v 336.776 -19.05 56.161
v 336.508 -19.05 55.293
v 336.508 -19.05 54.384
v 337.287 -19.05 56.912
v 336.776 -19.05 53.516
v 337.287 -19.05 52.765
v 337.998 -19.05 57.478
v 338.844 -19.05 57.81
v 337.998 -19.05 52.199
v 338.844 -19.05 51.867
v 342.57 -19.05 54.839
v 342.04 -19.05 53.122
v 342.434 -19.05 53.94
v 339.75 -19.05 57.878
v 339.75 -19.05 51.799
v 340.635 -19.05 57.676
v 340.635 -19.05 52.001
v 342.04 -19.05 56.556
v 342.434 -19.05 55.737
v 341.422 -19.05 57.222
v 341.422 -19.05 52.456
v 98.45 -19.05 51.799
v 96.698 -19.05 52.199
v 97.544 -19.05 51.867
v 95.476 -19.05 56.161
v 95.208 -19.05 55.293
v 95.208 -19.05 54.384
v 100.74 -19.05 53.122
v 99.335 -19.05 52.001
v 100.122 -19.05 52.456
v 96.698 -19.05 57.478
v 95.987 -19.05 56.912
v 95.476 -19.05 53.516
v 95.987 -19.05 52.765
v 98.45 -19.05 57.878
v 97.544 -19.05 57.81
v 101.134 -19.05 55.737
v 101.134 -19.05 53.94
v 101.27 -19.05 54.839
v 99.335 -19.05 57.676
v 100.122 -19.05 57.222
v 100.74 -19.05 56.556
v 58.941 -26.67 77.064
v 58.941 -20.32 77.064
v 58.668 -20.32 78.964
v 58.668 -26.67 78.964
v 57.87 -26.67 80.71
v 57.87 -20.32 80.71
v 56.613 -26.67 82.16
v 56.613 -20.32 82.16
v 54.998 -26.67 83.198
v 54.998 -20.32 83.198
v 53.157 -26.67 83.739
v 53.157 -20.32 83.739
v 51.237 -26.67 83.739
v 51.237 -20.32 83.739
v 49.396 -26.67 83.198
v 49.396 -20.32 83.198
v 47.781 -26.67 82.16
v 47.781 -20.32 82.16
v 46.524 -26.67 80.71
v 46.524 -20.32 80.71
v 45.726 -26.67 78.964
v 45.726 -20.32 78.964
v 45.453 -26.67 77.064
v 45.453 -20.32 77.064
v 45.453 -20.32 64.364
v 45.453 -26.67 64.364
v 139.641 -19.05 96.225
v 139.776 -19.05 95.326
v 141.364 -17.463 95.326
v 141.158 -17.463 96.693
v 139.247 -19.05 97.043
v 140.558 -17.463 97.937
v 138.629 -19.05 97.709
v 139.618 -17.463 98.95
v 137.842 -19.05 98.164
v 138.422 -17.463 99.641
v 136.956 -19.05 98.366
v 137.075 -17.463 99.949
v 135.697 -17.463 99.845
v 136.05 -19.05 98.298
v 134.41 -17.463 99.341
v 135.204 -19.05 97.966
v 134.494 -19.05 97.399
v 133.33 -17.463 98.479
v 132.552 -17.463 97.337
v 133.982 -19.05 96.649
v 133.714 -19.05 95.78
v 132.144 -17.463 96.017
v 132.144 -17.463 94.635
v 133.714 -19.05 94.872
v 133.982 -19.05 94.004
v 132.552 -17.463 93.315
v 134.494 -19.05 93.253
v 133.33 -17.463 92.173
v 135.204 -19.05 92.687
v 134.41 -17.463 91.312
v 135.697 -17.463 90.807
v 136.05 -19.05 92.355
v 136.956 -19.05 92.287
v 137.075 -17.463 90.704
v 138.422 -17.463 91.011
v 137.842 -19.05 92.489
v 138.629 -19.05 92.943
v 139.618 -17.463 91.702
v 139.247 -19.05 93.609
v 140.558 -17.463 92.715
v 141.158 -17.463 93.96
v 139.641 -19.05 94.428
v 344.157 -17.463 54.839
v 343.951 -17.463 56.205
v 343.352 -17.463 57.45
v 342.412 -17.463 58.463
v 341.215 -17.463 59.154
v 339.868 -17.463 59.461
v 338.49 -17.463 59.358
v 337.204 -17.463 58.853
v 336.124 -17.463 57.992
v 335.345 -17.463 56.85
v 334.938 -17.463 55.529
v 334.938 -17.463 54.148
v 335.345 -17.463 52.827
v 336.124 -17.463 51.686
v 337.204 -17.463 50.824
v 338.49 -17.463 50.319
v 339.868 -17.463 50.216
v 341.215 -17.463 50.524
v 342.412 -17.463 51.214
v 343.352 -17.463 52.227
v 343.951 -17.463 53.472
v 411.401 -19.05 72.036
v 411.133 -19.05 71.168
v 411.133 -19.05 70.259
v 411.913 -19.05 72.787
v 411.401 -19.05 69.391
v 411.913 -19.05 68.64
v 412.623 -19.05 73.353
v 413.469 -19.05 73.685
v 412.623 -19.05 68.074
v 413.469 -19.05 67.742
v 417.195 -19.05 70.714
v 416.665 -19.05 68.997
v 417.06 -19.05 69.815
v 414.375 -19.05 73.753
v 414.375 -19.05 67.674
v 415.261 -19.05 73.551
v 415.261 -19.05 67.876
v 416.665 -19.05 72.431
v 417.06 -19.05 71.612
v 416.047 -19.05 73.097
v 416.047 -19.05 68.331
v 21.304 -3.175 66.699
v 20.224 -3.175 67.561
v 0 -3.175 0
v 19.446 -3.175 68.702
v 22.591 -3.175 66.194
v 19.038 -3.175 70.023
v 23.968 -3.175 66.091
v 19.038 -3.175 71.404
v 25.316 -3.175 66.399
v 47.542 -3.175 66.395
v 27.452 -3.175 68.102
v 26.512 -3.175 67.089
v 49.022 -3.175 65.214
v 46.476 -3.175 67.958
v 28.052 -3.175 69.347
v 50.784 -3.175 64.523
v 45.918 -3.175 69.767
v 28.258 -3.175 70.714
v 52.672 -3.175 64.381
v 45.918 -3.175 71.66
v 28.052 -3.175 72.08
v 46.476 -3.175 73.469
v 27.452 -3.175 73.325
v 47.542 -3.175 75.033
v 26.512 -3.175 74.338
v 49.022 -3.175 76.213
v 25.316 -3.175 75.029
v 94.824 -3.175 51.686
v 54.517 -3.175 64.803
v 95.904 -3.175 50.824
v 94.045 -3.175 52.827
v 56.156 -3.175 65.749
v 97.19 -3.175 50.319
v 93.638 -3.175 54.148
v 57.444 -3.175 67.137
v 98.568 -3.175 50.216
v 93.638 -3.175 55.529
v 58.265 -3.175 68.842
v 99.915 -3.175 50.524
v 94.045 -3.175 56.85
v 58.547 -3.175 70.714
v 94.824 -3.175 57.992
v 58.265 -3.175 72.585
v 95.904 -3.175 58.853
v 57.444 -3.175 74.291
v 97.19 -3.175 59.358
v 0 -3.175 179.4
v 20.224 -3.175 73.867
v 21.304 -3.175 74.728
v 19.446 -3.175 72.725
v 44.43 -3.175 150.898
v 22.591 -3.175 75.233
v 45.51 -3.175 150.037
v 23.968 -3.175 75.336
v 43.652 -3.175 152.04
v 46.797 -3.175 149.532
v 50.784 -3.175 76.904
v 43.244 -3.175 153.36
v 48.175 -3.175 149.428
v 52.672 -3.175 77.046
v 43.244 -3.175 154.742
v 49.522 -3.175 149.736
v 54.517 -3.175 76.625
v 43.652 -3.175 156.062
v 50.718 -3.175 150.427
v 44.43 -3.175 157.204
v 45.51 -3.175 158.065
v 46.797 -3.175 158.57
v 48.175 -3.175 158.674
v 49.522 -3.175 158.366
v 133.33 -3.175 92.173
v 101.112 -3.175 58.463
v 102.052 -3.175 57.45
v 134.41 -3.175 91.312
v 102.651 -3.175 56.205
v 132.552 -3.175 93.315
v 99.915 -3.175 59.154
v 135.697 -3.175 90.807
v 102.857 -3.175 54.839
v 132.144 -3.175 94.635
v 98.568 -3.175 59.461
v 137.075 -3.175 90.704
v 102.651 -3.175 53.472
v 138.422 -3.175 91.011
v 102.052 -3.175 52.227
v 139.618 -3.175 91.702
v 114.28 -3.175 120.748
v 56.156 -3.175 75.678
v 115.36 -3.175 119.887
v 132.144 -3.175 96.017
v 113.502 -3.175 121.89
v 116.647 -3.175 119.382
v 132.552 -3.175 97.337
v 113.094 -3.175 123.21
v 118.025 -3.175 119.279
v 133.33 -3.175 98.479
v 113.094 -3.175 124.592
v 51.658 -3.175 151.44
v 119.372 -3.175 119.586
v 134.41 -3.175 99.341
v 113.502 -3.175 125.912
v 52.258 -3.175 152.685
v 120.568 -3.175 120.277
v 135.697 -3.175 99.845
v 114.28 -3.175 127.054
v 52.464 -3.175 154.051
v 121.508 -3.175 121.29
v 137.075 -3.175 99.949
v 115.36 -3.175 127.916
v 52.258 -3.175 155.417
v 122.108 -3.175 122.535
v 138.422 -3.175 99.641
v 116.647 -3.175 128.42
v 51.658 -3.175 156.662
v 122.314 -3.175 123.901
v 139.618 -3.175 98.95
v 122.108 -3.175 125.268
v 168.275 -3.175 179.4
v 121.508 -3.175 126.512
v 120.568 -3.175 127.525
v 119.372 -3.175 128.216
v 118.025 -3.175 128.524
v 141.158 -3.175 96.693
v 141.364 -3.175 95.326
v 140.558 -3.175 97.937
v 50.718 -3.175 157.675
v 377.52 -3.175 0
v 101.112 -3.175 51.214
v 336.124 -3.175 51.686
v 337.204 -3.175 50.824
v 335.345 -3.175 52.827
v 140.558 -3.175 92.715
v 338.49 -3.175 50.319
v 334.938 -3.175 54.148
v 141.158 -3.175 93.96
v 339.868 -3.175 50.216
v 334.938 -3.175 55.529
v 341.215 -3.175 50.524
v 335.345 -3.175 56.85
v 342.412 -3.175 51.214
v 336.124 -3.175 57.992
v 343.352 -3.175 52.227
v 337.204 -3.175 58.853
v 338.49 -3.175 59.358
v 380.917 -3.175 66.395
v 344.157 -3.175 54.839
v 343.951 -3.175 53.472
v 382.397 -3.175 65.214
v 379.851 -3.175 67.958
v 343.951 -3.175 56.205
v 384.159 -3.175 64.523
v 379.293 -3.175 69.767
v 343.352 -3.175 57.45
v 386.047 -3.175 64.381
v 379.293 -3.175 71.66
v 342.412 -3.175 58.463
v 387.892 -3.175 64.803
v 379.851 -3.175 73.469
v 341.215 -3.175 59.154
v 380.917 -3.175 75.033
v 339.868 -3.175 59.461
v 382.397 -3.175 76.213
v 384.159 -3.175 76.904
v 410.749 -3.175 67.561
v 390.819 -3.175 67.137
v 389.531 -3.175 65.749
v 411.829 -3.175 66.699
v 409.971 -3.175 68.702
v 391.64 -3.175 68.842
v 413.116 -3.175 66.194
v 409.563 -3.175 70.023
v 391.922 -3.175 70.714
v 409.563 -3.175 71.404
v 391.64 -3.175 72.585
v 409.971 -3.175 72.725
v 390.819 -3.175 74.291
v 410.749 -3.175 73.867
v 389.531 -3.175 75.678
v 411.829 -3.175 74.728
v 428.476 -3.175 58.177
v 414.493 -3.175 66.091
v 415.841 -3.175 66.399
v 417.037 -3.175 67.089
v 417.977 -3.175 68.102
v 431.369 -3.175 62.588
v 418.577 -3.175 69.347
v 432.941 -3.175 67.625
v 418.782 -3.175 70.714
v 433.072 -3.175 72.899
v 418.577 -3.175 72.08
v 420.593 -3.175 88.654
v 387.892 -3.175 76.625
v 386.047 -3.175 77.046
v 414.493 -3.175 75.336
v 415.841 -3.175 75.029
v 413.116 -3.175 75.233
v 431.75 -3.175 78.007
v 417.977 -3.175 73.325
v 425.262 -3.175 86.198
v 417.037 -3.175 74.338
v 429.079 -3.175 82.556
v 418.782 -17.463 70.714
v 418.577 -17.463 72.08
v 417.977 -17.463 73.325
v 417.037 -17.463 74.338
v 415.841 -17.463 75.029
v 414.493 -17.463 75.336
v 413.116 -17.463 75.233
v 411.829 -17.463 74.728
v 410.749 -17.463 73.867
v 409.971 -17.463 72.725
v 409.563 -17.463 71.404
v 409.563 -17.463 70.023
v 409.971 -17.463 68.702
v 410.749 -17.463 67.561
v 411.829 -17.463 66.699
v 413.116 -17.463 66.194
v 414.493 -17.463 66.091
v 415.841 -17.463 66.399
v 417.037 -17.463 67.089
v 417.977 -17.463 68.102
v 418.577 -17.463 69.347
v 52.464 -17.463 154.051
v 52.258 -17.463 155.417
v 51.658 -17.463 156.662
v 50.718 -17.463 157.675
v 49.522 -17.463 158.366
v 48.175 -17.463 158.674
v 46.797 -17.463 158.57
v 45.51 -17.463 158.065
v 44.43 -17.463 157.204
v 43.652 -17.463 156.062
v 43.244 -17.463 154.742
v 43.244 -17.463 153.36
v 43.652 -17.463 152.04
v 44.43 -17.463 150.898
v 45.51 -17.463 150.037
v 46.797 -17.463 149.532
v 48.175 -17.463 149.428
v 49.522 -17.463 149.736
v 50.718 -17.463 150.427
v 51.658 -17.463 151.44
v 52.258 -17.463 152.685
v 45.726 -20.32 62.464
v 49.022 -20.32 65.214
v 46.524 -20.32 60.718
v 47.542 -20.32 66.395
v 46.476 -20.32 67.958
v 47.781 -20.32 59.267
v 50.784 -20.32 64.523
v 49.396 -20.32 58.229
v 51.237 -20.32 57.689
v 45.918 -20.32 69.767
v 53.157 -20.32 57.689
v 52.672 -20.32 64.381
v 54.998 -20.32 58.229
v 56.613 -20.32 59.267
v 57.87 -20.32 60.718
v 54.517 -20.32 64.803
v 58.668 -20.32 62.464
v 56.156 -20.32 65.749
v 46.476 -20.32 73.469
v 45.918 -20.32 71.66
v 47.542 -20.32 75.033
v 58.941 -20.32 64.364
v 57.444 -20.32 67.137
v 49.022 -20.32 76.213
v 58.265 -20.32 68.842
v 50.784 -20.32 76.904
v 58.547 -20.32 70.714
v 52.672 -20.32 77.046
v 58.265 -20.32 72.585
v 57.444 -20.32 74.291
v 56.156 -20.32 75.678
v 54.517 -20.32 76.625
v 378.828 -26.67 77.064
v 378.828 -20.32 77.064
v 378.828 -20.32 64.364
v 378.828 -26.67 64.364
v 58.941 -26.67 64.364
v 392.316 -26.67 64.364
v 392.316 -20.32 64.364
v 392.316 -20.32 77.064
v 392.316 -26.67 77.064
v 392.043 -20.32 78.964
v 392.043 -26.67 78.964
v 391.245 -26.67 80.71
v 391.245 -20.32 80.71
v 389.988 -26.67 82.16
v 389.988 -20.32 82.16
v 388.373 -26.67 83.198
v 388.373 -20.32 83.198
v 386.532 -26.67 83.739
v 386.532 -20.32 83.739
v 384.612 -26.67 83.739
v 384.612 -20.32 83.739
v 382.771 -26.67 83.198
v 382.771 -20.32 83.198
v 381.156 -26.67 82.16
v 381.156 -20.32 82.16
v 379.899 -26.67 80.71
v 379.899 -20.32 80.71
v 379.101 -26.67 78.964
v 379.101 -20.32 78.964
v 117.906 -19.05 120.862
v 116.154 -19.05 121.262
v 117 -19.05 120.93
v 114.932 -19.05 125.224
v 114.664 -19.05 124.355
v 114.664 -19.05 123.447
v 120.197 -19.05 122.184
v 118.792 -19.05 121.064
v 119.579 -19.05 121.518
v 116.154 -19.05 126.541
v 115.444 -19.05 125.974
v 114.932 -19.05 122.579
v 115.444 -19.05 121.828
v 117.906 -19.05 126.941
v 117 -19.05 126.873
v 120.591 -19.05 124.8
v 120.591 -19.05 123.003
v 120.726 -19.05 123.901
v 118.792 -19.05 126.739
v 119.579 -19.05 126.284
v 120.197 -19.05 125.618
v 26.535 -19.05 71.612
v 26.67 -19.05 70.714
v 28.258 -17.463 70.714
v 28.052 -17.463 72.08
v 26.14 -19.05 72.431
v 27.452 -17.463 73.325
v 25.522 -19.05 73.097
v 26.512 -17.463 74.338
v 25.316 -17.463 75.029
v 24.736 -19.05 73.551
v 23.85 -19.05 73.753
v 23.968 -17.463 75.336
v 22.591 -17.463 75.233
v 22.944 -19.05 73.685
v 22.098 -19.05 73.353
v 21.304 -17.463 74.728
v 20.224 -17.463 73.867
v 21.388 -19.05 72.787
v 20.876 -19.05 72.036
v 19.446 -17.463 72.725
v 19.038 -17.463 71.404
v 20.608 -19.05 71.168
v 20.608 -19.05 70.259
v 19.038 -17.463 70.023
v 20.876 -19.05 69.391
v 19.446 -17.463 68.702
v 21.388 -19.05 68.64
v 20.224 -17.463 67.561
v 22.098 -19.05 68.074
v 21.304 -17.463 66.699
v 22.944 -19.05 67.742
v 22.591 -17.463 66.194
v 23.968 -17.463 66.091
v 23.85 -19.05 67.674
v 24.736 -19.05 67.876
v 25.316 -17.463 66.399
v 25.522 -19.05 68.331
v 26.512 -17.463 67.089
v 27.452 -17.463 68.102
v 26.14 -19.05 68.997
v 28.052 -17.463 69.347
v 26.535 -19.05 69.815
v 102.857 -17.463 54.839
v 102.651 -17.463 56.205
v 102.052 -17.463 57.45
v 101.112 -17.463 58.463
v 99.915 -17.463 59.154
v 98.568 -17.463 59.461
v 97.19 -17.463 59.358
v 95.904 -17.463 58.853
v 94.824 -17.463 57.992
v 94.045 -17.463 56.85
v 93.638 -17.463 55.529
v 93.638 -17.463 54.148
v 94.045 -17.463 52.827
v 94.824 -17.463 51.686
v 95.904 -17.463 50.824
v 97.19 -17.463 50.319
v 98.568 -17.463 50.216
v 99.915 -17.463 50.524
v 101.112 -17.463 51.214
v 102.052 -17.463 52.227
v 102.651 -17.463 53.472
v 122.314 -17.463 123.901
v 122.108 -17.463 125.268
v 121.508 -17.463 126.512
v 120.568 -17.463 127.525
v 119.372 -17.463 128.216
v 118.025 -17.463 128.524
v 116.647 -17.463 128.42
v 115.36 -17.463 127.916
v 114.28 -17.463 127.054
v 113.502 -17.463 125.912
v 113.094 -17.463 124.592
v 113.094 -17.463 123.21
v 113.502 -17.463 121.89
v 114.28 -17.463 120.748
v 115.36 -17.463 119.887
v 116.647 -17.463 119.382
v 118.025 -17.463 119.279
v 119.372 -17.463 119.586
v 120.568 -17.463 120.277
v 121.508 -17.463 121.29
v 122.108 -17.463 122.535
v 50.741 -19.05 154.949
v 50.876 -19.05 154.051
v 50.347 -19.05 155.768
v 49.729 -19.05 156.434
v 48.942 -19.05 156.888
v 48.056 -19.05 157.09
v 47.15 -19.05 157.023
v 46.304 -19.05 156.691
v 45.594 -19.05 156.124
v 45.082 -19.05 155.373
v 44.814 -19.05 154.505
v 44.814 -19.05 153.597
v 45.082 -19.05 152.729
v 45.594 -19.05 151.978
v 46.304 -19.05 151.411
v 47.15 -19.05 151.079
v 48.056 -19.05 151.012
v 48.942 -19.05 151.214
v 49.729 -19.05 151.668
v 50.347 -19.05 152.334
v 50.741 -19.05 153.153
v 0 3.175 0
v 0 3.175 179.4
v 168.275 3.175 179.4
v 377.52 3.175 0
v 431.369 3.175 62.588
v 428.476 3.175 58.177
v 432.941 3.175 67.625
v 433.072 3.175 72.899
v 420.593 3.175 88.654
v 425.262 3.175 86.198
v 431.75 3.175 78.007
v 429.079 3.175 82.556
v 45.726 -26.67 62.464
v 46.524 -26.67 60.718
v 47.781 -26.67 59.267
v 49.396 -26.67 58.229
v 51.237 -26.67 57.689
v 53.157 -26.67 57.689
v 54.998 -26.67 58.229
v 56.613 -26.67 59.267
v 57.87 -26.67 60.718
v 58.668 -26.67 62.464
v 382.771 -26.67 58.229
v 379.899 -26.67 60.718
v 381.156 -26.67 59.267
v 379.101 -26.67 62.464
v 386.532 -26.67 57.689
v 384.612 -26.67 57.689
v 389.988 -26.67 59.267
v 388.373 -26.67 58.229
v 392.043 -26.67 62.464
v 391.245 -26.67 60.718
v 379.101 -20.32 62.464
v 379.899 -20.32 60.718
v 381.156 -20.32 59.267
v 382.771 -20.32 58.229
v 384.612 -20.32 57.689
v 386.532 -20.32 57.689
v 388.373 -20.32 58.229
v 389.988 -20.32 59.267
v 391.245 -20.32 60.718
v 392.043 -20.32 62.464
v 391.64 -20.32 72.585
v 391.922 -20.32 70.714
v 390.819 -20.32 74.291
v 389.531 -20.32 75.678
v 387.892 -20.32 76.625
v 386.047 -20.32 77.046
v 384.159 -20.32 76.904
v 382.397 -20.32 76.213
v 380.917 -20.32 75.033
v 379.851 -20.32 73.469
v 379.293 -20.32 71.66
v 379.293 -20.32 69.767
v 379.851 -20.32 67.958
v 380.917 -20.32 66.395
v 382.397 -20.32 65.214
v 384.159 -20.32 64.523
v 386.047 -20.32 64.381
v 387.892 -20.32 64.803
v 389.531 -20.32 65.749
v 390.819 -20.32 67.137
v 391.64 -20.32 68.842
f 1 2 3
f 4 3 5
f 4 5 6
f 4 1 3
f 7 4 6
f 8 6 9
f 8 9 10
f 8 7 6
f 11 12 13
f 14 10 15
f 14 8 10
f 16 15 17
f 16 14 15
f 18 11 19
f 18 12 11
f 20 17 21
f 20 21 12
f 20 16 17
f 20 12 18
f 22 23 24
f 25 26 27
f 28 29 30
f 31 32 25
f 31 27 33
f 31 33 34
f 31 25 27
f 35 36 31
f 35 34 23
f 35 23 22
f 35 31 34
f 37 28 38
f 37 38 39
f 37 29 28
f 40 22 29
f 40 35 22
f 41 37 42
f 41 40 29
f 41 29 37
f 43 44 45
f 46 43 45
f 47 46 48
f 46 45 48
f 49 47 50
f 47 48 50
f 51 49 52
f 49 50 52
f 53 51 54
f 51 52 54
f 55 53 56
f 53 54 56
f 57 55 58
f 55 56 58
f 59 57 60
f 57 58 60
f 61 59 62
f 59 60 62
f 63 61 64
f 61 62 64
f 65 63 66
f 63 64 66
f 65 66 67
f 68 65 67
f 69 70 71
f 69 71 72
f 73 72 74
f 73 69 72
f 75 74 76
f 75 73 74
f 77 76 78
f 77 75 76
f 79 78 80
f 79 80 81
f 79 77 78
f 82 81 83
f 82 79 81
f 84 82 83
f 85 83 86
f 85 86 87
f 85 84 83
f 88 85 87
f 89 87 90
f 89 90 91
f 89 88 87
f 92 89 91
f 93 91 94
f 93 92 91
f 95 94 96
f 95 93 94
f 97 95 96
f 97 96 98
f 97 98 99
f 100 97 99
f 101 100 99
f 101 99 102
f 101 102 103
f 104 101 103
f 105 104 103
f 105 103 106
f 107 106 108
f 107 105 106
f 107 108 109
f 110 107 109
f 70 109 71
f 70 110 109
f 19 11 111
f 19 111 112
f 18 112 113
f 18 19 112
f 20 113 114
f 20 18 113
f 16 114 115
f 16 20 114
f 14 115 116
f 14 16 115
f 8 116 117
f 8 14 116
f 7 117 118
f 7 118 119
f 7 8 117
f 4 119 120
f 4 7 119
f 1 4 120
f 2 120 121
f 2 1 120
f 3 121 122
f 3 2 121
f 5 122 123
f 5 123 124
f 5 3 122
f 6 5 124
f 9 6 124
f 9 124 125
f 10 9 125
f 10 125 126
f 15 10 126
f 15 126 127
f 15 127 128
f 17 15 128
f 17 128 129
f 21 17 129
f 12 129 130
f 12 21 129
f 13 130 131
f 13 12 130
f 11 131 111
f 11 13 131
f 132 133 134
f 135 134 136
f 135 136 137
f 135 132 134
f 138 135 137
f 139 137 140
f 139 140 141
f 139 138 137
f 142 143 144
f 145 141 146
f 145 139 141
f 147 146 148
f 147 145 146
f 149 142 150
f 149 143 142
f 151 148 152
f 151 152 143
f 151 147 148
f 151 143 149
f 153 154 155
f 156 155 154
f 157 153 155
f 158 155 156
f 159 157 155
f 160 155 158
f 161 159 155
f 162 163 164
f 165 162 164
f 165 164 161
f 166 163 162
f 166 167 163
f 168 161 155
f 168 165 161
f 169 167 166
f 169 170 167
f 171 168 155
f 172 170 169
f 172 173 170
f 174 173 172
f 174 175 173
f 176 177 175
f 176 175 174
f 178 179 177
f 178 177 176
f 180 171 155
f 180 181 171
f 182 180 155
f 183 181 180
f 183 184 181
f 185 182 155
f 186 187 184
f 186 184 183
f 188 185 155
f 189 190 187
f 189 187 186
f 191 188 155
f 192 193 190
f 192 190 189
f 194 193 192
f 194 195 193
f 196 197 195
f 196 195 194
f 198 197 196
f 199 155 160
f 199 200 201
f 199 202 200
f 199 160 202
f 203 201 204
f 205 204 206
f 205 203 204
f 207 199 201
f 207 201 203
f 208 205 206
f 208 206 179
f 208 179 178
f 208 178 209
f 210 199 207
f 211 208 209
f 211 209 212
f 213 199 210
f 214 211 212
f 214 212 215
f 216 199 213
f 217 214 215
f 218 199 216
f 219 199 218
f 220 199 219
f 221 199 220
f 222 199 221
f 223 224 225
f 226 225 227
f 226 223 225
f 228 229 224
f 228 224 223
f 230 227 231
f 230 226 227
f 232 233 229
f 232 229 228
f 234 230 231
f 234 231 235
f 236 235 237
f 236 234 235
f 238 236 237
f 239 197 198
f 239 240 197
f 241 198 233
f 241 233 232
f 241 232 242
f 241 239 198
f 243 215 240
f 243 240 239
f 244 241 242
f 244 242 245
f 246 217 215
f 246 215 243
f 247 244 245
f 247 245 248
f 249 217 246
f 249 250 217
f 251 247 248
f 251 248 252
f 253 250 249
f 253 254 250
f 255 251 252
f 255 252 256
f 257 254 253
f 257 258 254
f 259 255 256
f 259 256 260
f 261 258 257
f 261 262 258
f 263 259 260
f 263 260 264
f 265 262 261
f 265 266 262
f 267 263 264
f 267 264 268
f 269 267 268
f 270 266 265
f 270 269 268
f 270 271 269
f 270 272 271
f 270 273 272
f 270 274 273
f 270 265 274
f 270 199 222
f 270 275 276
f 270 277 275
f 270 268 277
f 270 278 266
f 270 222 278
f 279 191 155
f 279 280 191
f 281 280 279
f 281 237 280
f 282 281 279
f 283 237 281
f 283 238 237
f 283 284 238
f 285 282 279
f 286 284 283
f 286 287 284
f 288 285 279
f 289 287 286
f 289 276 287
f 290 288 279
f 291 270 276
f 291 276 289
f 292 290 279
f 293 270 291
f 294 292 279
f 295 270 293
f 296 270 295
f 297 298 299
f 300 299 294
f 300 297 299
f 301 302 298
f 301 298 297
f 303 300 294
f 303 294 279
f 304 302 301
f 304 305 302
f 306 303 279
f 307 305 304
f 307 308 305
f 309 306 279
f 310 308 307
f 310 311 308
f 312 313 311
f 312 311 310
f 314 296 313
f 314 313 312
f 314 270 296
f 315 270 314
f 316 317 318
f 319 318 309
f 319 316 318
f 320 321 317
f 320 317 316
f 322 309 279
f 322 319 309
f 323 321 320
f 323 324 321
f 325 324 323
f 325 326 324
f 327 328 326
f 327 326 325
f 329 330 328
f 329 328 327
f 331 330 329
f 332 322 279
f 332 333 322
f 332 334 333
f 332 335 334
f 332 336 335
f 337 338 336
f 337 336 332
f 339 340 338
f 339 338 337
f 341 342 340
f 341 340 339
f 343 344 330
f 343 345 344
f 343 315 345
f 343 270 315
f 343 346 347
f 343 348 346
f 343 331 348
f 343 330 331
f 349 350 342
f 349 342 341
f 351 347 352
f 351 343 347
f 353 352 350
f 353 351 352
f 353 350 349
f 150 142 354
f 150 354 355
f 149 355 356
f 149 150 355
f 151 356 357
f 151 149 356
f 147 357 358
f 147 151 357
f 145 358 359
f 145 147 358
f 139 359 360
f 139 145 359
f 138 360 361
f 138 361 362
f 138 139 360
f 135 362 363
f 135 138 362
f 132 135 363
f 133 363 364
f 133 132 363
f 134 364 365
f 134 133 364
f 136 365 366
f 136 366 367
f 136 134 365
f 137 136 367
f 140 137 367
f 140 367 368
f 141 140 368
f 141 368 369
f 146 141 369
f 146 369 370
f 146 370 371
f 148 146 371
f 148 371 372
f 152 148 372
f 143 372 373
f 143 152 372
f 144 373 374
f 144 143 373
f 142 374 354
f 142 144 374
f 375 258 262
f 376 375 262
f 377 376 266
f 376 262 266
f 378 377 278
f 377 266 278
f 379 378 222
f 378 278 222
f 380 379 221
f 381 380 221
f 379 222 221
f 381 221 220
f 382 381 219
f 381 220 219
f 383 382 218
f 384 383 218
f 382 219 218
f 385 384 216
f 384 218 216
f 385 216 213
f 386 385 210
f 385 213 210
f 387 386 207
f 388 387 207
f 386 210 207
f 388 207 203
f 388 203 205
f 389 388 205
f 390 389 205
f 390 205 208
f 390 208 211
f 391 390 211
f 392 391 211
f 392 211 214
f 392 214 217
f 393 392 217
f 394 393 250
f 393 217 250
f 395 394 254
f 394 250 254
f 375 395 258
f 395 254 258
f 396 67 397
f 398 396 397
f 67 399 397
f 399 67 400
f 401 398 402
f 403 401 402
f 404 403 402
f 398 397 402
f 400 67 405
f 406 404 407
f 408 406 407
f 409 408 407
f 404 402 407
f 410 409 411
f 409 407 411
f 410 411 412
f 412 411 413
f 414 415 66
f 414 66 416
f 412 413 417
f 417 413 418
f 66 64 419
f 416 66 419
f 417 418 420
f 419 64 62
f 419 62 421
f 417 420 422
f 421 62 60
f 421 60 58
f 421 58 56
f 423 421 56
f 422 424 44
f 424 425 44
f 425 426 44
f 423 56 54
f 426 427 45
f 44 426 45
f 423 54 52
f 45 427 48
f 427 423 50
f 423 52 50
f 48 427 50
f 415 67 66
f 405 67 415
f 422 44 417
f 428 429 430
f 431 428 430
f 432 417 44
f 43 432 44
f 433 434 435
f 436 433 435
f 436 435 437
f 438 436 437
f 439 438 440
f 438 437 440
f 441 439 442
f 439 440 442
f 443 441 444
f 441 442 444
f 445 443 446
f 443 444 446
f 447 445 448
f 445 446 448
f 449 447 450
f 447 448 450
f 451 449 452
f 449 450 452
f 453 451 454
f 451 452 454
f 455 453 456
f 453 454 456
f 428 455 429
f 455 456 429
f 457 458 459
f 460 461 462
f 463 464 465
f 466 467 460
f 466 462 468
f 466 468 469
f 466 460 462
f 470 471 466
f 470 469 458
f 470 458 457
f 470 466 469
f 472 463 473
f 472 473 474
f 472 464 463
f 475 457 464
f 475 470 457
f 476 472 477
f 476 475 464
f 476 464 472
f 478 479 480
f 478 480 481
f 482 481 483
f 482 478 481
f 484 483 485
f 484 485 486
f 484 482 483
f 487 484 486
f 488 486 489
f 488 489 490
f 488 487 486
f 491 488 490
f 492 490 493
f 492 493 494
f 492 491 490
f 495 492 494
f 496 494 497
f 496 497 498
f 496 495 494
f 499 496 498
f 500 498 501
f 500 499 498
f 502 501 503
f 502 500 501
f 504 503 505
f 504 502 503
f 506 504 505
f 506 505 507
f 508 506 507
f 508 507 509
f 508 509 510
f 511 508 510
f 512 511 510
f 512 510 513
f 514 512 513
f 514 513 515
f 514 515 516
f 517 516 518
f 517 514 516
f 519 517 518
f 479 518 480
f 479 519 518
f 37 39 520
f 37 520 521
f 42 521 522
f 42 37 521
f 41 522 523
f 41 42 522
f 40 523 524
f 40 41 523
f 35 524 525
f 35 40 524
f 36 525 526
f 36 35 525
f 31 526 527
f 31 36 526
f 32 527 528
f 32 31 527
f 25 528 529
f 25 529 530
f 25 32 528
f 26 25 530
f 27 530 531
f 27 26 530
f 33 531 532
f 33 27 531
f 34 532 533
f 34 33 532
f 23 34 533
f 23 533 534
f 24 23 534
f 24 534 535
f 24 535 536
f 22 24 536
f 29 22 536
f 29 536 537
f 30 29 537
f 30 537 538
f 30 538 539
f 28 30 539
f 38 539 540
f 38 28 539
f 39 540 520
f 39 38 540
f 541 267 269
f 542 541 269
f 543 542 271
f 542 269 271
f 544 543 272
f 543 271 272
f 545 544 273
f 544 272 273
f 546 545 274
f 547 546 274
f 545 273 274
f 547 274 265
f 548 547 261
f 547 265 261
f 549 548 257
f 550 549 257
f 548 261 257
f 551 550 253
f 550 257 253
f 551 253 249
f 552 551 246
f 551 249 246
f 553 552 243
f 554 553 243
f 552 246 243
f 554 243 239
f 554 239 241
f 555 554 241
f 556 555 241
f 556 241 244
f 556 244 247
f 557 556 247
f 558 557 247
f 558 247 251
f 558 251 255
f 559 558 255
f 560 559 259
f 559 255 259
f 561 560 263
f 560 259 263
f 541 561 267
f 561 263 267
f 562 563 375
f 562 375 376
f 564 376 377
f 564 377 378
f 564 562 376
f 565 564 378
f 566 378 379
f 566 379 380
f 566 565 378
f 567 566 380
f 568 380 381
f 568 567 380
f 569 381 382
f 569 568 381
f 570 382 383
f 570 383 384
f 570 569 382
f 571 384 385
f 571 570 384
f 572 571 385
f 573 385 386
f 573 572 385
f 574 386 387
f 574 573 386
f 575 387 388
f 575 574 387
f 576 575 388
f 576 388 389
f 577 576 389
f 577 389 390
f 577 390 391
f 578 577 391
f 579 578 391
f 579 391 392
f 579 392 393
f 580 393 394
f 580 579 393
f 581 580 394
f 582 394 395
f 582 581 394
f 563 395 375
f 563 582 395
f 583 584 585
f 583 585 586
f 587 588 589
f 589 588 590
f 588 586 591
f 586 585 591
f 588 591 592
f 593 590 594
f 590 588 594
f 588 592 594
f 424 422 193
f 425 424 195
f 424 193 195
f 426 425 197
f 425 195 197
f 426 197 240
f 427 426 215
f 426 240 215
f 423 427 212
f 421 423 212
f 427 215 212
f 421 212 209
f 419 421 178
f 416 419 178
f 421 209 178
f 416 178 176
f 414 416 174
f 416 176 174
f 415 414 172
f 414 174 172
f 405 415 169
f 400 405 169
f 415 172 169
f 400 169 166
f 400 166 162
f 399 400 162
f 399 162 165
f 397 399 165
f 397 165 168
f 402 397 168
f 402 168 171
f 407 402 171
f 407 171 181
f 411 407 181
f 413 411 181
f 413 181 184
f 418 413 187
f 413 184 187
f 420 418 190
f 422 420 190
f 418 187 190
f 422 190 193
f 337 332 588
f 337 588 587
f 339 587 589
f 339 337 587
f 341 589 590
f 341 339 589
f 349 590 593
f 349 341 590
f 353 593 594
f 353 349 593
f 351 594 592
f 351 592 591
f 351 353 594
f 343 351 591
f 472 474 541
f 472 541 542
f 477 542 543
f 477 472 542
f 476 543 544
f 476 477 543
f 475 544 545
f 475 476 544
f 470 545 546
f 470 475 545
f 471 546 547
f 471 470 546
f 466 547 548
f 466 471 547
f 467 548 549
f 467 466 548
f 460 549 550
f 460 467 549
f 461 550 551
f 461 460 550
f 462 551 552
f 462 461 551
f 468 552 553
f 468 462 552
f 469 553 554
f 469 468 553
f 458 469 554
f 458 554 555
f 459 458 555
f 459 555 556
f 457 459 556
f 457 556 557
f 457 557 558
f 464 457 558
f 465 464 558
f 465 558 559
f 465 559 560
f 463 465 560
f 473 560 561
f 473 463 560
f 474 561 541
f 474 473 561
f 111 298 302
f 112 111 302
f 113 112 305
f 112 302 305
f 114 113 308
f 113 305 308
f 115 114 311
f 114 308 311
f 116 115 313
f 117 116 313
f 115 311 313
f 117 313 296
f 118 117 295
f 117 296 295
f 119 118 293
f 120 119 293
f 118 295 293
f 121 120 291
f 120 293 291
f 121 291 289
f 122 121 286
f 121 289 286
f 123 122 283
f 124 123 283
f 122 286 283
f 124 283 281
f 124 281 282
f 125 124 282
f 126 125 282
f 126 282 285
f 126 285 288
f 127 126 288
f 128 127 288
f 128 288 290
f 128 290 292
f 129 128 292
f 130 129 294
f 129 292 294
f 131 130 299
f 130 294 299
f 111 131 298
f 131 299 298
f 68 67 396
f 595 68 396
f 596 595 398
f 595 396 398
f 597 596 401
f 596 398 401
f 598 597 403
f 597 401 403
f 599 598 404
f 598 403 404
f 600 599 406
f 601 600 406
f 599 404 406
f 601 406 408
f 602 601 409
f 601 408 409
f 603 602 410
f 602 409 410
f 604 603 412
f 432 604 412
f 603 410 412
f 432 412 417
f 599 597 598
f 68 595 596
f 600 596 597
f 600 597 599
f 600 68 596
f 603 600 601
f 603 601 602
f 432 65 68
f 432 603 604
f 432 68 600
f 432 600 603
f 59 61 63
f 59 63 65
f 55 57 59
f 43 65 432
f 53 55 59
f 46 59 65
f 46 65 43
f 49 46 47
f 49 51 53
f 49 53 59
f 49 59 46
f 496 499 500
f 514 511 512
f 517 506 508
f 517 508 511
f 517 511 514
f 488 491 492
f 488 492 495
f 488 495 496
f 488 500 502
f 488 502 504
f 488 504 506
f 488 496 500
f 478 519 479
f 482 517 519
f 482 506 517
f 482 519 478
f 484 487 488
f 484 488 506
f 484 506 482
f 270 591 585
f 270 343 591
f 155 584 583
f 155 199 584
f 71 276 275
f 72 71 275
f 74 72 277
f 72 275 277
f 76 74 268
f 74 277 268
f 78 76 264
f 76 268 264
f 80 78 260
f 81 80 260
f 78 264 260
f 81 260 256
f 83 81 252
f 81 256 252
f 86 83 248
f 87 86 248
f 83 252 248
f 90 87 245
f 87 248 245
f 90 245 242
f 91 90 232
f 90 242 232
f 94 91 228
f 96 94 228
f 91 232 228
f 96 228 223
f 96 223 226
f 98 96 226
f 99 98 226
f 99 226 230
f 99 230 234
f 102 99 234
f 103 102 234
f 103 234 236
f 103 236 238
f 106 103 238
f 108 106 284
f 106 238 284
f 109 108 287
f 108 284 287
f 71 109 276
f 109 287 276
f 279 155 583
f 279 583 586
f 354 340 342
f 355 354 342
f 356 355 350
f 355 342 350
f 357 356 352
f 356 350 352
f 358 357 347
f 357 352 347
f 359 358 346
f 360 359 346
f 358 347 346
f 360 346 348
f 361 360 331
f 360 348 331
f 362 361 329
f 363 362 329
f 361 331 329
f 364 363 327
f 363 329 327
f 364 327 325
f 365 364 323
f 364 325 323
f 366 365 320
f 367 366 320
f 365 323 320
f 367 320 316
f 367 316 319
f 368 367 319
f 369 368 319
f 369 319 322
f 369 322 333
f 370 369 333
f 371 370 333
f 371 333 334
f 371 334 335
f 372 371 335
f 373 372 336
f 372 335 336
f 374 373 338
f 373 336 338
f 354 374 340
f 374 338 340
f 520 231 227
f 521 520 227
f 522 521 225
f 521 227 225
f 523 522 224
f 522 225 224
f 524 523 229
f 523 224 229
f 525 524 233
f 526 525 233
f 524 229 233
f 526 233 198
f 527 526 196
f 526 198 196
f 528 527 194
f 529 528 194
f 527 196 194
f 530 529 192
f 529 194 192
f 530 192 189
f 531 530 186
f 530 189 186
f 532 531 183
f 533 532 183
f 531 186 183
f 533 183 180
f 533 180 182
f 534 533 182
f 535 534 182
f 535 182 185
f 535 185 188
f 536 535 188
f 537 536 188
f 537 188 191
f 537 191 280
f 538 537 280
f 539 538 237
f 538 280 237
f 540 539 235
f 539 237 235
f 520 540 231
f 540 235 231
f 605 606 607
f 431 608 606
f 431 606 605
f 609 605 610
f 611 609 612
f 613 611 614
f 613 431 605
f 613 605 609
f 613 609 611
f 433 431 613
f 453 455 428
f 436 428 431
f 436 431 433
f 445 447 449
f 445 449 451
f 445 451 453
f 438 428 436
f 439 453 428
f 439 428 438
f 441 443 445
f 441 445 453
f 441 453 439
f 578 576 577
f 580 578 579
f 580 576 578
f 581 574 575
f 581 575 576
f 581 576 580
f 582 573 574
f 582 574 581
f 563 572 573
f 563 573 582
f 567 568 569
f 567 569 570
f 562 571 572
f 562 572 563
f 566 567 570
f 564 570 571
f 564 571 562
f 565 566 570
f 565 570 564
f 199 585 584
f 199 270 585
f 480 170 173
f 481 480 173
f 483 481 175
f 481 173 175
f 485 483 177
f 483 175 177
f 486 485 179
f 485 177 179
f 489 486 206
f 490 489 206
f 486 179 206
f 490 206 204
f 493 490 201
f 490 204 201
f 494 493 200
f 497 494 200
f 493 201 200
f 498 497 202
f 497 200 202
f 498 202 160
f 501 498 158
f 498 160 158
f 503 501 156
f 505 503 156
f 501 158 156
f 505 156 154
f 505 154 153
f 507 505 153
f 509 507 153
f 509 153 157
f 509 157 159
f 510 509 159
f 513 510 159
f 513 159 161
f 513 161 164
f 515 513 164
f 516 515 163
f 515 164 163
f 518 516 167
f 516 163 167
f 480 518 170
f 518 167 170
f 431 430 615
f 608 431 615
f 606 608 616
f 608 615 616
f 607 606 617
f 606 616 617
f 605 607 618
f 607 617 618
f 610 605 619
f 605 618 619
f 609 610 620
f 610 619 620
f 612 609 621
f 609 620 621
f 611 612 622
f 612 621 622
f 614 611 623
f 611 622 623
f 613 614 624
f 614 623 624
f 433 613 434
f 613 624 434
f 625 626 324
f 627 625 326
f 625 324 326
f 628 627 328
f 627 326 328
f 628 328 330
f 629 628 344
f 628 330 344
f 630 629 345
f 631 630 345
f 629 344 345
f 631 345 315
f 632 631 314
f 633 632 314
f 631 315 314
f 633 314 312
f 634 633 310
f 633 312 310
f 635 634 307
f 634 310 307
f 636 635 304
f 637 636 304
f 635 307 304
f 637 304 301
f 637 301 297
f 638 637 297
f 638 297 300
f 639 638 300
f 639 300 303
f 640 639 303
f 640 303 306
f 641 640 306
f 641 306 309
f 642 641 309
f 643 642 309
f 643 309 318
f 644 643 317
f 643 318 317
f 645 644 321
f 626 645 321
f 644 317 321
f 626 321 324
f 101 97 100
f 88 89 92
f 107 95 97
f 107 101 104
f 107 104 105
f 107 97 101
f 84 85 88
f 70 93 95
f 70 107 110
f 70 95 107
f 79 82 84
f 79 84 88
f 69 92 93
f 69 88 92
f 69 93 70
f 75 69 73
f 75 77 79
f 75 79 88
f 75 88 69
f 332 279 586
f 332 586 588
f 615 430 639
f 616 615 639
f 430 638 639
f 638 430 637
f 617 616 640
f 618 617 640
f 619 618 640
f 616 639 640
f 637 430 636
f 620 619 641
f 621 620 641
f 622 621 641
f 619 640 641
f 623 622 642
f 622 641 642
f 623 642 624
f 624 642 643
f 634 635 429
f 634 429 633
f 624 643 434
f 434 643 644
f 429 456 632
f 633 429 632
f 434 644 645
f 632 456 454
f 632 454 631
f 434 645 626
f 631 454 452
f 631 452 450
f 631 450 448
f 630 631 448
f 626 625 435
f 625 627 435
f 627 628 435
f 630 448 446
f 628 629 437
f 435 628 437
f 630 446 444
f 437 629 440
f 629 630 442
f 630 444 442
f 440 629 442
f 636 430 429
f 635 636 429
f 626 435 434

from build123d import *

# Parameters (mm, degrees)
F1_DEPTH  = 3.175
F2_R      = 4.6355
F3_DEPTH  = 15.875
F4_SIZE   = 1.5875
F6_R      = 6.35
F7_DEPTH  = 17.145
F9_DEPTH  = 6.35
F11_DEPTH = 6.35


with BuildPart() as f1:
    # F0 (on Front) → F1 (new body, symmetric)
    with BuildSketch(Plane.XZ):
        with BuildLine():
            Line((0, 179.4002), (0, 0))
            Line((0, 0), (377.5202, 0))
            Line((377.5202, 0), (428.4760097452, 58.1765707746))
            ThreePointArc((428.4760097452, 58.1765707746), (432.588720587, 75.4986793815), (420.5927391638, 88.6541446621))
            Line((420.5927391638, 88.6541446621), (168.275, 179.4002))
            Line((168.275, 179.4002), (0, 179.4002))
        make_face()
    extrude(amount=F1_DEPTH, both=True)

    # F2 (on face) → F3 (join)
    with BuildSketch(Plane.XZ.offset(3.175)):
        with Locations((23.622, 70.7136)):
            Circle(F2_R)
        with Locations((98.2218, 54.8386)):
            Circle(F2_R)
        with Locations((339.5218, 54.8386)):
            Circle(F2_R)
        with Locations((136.7282, 95.3262)):
            Circle(F2_R)
        with Locations((47.8282, 154.051)):
            Circle(F2_R)
        with Locations((117.6782, 123.9012)):
            Circle(F2_R)
        with Locations((414.147, 70.7136)):
            Circle(F2_R)
    extrude(amount=F3_DEPTH)

    # F4
    f4_edges = [f1.edges().sort_by_distance(p)[0] for p in [
        (18.9865, -19.05, 70.7136),
        (43.1927, -19.05, 154.051),
        (93.5863, -19.05, 54.8386),
        (113.0427, -19.05, 123.9012),
        (132.0927, -19.05, 95.3262),
        (334.8863, -19.05, 54.8386),
        (409.5115, -19.05, 70.7136),
    ]]
    chamfer(f4_edges, length=F4_SIZE)

    # F6 (on face) → F7 (join)
    with BuildSketch(Plane.XZ.offset(3.175)):
        with Locations((385.572, 70.7136)):
            Circle(F6_R)
        with Locations((52.197, 70.7136)):
            Circle(F6_R)
    extrude(amount=F7_DEPTH)

    # F8 (on face) → F9 (join)
    with BuildSketch(Plane.XZ.offset(20.32)):
        with BuildLine():
            ThreePointArc((58.9407, 77.0636), (52.197, 83.8073), (45.4533, 77.0636))
            Line((45.4533, 77.0636), (45.4533, 64.3636))
            ThreePointArc((45.4533, 64.3636), (52.197, 57.6199), (58.9407, 64.3636))
            Line((58.9407, 64.3636), (58.9407, 77.0636))
        make_face()
    extrude(amount=F9_DEPTH)

    # F10 (on face) → F11 (join)
    with BuildSketch(Plane.XZ.offset(20.32)):
        with BuildLine():
            ThreePointArc((387.8424602375, 70.7136), (391.0851112991, 73.1799041451), (392.3157, 77.0636))
            ThreePointArc((392.3157, 77.0636), (385.572, 83.8073), (378.8283, 77.0636))
            ThreePointArc((378.8283, 77.0636), (380.0588887009, 73.1799041451), (383.3015397625, 70.7136))
            ThreePointArc((383.3015397625, 70.7136), (385.572, 71.1073), (387.8424602375, 70.7136))
        make_face()
        with BuildLine():
            Line((392.3157, 64.3636), (392.3157, 77.0636))
            ThreePointArc((392.3157, 77.0636), (391.0851112991, 73.1799041451), (387.8424602375, 70.7136))
            ThreePointArc((387.8424602375, 70.7136), (391.0851112991, 68.2472958549), (392.3157, 64.3636))
        make_face()
        with BuildLine():
            ThreePointArc((383.3015397625, 70.7136), (380.0588887009, 73.1799041451), (378.8283, 77.0636))
            Line((378.8283, 77.0636), (378.8283, 64.3636))
            ThreePointArc((378.8283, 64.3636), (380.0588887009, 68.2472958549), (383.3015397625, 70.7136))
        make_face()
        with BuildLine():
            ThreePointArc((392.3157, 64.3636), (391.0851112991, 68.2472958549), (387.8424602375, 70.7136))
            ThreePointArc((387.8424602375, 70.7136), (385.572, 70.3199), (383.3015397625, 70.7136))
            ThreePointArc((383.3015397625, 70.7136), (380.0588887009, 68.2472958549), (378.8283, 64.3636))
            ThreePointArc((378.8283, 64.3636), (385.572, 57.6199), (392.3157, 64.3636))
        make_face()
        with BuildLine():
            ThreePointArc((383.3015397625, 70.7136), (385.572, 70.3199), (387.8424602375, 70.7136))
            ThreePointArc((387.8424602375, 70.7136), (385.572, 71.1073), (383.3015397625, 70.7136))
        make_face()
    extrude(amount=F11_DEPTH)


solid = f1.part
